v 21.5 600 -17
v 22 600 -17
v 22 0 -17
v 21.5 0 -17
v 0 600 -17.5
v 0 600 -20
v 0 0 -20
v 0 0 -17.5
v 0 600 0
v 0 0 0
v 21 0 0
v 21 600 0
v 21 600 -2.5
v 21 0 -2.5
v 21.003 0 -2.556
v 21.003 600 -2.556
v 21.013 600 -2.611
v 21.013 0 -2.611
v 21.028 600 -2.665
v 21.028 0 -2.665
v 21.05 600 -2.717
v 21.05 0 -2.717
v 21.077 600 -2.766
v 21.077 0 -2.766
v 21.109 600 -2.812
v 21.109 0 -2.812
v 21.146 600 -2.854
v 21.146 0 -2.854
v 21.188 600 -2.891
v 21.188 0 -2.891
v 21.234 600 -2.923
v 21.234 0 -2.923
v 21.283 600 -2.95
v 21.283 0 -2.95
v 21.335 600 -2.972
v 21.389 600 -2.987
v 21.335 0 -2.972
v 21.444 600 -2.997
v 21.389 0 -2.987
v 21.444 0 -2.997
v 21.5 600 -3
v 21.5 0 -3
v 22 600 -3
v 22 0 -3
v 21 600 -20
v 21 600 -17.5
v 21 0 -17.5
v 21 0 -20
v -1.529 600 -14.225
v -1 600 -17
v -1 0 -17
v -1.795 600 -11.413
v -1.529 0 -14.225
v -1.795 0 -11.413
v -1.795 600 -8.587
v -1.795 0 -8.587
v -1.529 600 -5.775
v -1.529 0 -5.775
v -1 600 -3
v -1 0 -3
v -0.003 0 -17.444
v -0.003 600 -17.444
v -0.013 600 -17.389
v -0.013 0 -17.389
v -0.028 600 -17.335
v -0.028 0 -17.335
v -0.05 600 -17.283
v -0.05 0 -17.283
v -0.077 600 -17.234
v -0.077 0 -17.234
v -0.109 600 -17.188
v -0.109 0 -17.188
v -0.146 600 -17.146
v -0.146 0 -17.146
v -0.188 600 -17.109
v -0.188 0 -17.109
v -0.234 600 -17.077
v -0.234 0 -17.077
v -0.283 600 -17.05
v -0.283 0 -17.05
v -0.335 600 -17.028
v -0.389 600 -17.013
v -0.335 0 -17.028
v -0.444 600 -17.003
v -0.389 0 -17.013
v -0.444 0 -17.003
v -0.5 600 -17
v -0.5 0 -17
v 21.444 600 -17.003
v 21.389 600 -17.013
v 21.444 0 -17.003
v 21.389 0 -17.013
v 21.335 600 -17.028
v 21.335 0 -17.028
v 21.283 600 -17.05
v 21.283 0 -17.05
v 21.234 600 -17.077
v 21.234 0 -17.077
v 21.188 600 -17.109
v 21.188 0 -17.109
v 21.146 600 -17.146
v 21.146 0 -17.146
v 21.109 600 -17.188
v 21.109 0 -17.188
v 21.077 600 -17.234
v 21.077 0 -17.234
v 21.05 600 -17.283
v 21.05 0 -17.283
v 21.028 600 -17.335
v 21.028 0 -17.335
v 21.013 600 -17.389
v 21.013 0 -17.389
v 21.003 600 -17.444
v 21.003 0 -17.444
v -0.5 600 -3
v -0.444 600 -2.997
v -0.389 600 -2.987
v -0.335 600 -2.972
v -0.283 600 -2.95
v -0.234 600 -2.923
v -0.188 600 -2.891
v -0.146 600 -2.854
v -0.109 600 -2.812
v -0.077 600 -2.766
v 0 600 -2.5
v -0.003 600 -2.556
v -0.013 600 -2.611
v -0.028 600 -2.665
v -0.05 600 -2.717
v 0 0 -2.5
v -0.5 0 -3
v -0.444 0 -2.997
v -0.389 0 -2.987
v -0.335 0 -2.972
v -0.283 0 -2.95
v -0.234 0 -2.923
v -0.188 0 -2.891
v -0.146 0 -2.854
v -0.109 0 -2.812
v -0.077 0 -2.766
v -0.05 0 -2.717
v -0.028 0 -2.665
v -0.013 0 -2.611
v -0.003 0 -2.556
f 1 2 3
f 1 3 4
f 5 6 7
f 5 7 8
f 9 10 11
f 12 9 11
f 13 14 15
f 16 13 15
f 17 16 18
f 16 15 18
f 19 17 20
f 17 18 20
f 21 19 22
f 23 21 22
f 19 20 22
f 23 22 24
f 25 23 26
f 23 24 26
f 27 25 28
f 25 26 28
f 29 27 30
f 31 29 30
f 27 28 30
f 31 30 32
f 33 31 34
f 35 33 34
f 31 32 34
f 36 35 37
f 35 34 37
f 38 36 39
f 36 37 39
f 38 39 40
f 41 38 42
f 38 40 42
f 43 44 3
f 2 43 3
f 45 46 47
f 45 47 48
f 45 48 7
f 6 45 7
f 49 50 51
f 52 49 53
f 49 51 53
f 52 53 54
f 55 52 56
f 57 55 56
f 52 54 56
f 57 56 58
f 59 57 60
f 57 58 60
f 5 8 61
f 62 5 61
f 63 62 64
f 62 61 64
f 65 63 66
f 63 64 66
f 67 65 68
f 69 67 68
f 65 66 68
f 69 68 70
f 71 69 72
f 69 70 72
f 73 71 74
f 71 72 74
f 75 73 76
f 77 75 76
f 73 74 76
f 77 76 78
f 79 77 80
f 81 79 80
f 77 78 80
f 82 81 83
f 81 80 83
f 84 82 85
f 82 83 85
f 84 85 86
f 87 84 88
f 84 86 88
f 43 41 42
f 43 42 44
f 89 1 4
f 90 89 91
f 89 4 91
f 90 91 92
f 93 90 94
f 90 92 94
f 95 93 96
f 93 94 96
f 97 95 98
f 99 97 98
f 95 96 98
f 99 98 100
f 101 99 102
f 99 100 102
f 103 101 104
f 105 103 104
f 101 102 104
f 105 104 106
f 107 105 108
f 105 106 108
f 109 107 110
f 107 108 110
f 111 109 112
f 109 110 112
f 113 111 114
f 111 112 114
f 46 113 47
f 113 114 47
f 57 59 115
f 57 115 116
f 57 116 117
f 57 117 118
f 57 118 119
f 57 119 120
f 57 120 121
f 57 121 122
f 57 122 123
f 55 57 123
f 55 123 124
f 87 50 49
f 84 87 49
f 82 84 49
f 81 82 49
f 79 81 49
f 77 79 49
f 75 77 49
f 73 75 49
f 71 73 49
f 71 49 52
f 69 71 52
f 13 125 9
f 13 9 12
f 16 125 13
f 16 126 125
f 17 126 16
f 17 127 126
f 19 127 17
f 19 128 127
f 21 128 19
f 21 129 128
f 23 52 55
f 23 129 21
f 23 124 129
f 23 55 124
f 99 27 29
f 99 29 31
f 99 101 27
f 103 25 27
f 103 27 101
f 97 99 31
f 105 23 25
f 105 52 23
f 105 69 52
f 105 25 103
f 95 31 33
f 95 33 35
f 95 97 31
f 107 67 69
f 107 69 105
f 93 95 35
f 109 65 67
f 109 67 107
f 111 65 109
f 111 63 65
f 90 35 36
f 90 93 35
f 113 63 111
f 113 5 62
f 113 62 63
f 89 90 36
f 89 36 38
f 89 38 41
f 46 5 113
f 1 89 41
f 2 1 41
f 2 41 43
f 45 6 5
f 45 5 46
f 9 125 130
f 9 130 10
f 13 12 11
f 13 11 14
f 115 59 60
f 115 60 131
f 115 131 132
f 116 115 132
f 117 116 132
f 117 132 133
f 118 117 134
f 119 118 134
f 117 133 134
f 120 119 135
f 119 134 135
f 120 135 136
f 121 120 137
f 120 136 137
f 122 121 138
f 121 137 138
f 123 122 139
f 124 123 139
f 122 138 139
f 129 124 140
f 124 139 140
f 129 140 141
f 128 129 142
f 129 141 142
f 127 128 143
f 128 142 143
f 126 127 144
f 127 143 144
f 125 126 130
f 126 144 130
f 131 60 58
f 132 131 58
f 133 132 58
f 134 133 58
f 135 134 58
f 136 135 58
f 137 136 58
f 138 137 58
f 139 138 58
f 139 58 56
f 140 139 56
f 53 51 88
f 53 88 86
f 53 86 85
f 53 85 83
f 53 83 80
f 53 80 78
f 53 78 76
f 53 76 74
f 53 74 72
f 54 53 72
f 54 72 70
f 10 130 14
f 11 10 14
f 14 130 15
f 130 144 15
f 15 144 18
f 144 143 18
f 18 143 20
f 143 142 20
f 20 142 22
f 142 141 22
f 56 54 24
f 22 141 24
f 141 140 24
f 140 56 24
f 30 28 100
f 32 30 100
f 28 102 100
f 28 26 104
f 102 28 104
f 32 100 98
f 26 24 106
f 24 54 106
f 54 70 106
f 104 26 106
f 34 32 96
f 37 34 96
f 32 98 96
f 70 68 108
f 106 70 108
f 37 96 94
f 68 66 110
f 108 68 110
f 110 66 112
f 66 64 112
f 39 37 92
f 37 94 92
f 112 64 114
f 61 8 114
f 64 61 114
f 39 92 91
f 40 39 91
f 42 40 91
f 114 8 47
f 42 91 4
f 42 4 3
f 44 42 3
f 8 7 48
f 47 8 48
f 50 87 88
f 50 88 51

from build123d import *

# Parameters (mm, degrees)
SALIENTE_EXTRUIR1_DEPTH = 600


with BuildPart() as part:
    # Croquis1 → Saliente-Extruir1 (new body)
    with BuildSketch(Plane(origin=(0, 0, 0), x_dir=(1, 0, 0), z_dir=(0, 1, 0))):
        with BuildLine():
            Line((0, 2.5), (0, 0))
            Line((0, 0), (10.5, 0))
            Line((10.5, 0), (10.5, 20))
            Line((10.5, 20), (0, 20))
            Line((0, 20), (0, 17.5))
            ThreePointArc((0, 17.5), (-0.146446609, 17.146446609), (-0.5, 17))
            Line((-0.5, 17), (-1, 17))
            ThreePointArc((-1, 17), (-1.828095708, 10), (-1, 3))
            Line((-1, 3), (-0.5, 3))
            ThreePointArc((-0.5, 3), (-0.146446609, 2.853553391), (0, 2.5))
        make_face()
        with BuildLine():
            Line((10.5, 20), (10.5, 0))
            Line((10.5, 0), (21, 0))
            Line((21, 0), (21, 2.5))
            ThreePointArc((21, 2.5), (21.146446609, 2.853553391), (21.5, 3))
            Line((21.5, 3), (22, 3))
            Line((22, 3), (22, 17))
            Line((22, 17), (21.5, 17))
            ThreePointArc((21.5, 17), (21.146446609, 17.146446609), (21, 17.5))
            Line((21, 17.5), (21, 20))
            Line((21, 20), (10.5, 20))
        make_face()
    extrude(amount=SALIENTE_EXTRUIR1_DEPTH)


solid = part.part
